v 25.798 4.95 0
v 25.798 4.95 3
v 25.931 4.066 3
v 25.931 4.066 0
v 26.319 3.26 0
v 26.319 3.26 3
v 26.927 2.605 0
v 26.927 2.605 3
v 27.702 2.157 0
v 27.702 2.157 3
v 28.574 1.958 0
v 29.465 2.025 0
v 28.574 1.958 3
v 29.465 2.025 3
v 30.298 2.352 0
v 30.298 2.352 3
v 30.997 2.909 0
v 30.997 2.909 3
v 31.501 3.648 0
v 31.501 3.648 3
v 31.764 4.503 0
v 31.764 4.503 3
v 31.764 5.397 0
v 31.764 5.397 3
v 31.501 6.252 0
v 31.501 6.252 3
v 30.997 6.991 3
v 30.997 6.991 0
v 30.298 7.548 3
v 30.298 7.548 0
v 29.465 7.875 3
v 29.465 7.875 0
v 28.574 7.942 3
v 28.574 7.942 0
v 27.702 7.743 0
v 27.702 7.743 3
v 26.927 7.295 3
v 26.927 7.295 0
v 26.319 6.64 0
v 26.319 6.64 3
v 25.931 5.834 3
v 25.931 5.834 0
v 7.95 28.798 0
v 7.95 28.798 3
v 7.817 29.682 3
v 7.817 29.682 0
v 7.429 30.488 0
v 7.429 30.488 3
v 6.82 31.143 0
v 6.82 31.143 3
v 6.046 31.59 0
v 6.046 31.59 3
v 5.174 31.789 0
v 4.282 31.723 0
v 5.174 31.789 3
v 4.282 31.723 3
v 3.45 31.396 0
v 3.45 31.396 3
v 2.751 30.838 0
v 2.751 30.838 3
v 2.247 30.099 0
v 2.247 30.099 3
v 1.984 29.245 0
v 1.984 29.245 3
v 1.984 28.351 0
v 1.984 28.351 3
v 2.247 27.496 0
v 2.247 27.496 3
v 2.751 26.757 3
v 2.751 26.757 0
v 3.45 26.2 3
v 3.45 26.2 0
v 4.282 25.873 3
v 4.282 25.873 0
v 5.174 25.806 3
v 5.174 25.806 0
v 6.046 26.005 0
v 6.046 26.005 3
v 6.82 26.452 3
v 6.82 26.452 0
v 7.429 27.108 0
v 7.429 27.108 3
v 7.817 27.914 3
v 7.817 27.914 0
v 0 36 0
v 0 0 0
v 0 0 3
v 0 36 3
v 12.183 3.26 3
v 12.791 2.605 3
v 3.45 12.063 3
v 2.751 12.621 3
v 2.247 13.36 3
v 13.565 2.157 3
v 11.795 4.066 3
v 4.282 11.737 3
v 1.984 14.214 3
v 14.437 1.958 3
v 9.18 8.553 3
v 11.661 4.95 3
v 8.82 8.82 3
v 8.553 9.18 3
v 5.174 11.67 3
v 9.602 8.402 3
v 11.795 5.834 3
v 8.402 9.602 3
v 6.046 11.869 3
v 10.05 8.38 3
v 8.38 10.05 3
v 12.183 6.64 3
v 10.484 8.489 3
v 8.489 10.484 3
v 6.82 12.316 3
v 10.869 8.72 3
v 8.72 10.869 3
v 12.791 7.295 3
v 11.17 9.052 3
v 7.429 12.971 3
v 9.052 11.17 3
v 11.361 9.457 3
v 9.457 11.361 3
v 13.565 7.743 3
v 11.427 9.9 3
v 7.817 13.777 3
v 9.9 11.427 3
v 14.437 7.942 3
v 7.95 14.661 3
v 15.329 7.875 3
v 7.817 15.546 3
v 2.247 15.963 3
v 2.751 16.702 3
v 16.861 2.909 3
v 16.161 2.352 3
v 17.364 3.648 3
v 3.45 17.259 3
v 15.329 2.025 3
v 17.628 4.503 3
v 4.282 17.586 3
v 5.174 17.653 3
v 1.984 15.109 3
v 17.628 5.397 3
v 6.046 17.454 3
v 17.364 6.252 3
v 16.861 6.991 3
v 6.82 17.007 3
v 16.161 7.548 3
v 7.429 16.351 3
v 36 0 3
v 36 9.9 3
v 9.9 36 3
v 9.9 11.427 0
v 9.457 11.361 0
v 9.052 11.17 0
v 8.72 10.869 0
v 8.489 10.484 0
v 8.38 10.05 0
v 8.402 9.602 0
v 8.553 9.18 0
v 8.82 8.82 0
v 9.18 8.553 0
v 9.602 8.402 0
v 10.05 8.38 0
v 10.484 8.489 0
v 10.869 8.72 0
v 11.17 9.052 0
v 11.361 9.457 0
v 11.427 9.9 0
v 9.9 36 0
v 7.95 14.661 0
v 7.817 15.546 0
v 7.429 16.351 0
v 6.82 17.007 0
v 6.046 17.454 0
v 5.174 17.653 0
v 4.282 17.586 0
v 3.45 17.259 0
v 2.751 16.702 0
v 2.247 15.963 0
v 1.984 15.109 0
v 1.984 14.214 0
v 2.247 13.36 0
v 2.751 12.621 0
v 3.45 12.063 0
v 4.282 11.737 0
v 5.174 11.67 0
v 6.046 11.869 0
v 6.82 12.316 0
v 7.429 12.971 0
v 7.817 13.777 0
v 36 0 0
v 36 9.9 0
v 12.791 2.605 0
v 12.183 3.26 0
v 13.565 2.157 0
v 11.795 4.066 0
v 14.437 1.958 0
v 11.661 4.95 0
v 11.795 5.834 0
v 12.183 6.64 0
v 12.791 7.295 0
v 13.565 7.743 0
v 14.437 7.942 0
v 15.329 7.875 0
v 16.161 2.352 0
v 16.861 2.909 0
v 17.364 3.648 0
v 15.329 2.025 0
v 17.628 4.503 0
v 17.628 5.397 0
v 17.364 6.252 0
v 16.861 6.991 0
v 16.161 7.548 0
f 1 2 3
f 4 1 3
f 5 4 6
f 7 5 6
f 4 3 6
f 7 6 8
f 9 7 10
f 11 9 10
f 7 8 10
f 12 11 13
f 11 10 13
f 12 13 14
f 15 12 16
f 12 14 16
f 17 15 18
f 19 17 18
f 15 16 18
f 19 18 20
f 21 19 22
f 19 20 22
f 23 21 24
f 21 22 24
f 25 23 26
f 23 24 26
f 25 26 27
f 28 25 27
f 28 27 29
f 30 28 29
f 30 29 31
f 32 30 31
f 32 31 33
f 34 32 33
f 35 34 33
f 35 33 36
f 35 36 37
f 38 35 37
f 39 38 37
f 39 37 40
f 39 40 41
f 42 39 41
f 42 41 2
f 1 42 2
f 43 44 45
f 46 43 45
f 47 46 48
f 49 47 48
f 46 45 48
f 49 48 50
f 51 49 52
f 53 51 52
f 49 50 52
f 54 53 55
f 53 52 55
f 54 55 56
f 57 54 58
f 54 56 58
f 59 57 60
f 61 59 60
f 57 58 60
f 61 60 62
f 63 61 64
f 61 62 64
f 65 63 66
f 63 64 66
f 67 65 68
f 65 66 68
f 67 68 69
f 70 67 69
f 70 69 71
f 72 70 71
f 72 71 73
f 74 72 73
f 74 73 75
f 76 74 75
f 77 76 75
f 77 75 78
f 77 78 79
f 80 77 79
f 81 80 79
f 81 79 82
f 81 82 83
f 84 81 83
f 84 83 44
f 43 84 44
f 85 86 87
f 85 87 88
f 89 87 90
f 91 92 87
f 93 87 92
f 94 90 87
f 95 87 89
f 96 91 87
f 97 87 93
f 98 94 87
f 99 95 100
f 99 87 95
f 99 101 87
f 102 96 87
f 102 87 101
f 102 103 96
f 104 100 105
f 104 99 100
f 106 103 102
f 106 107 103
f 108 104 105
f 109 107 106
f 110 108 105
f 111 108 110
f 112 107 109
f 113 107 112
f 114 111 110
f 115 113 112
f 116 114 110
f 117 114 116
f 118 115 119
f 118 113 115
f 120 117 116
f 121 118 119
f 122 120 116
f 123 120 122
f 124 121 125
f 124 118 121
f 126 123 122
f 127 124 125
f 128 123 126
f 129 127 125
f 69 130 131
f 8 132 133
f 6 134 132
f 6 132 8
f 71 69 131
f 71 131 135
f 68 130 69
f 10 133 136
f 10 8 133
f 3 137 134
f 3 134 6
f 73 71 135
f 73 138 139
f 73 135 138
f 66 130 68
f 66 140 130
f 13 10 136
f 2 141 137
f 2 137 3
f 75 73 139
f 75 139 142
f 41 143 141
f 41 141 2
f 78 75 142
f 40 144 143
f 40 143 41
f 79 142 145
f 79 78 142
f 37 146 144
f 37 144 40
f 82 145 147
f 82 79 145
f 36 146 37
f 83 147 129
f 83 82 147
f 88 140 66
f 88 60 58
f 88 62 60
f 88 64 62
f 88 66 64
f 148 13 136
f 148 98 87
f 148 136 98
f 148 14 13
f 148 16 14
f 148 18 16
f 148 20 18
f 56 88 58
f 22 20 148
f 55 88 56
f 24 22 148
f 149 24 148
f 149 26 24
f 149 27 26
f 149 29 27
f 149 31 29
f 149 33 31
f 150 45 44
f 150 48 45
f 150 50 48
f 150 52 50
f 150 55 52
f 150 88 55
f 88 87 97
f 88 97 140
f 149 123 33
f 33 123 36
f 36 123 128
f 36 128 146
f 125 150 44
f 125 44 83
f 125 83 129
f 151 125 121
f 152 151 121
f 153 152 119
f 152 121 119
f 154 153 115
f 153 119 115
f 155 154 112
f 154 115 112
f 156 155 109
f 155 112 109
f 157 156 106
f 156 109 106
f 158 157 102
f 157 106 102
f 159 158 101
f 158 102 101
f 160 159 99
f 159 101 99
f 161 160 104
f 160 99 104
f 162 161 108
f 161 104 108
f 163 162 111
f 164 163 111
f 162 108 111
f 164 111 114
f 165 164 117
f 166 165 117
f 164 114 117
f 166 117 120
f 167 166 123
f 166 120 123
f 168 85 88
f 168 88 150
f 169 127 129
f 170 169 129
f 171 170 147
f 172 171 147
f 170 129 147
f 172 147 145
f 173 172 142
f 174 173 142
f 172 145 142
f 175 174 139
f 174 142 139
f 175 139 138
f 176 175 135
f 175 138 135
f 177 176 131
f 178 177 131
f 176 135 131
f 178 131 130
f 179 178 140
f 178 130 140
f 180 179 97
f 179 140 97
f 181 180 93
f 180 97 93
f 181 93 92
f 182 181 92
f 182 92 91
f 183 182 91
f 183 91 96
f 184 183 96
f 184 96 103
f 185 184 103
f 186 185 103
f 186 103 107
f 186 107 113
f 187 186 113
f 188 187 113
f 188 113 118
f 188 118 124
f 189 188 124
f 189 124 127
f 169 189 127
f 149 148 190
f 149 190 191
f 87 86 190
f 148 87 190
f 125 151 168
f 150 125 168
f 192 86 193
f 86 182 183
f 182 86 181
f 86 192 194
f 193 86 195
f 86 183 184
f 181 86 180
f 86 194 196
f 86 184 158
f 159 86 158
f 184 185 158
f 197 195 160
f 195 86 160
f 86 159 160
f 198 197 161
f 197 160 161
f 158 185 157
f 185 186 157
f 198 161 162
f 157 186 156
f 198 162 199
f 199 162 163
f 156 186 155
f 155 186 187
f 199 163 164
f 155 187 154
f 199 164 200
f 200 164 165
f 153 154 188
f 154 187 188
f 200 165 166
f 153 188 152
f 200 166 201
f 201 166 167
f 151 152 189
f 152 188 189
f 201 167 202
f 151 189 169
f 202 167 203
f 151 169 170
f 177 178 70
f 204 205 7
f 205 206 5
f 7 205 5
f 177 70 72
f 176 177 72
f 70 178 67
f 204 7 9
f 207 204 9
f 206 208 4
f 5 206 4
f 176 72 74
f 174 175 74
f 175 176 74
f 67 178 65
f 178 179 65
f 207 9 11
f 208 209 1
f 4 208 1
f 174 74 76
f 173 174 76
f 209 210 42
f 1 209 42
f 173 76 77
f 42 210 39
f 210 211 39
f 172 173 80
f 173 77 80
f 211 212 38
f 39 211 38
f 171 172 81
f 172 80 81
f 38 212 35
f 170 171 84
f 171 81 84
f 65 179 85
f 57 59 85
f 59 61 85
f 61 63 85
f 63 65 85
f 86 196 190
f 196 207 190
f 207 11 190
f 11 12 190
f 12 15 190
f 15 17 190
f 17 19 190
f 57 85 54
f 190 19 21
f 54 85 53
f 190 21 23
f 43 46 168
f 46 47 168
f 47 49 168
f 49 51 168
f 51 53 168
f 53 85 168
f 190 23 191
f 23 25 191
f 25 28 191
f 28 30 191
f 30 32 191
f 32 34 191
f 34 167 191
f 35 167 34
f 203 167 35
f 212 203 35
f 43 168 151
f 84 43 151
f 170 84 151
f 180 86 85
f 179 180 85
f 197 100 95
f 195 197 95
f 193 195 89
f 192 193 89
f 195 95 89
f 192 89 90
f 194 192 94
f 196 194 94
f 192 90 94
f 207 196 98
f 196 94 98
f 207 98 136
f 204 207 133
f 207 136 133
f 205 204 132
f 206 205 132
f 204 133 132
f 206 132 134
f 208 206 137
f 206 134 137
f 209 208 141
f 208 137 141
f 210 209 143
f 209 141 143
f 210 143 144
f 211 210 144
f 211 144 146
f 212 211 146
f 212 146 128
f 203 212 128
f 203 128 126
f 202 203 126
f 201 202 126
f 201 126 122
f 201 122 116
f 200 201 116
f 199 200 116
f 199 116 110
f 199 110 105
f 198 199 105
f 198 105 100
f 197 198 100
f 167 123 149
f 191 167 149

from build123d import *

# Parameters (mm, degrees)
SKETCH_1_W          = 9.9
SKETCH_1_H          = 36
EXTRUDE_1_DEPTH     = 3
SKETCH_2_W          = 36
SKETCH_2_H          = 9.9
EXTRUDE_2_DEPTH     = 3
SKETCH_3_R          = 3
CUT_EXTRUDE_1_DEPTH = 52
SKETCH_4_R          = 1.527094442
CUT_EXTRUDE_2_DEPTH = 52


with BuildPart() as part:
    # 草图1 → 凸台-拉伸1 (new body)
    with BuildSketch(Plane.XY):
        with Locations((4.95, 18)):
            Rectangle(SKETCH_1_W, SKETCH_1_H)
    extrude(amount=EXTRUDE_1_DEPTH)

    # 草图2 → 凸台-拉伸2 (add)
    with BuildSketch(Plane.XY.offset(3)):
        with Locations((18, 4.95)):
            Rectangle(SKETCH_2_W, SKETCH_2_H)
    extrude(amount=-EXTRUDE_2_DEPTH)

    # 草图3 → 切除-拉伸1 (cut, through all)
    with BuildSketch(Plane.XY.offset(3)):
        with Locations((4.95, 28.797804346)):
            Circle(SKETCH_3_R)
        with Locations((4.95, 14.661403113)):
            Circle(SKETCH_3_R)
        with Locations(Location((14.661403113, 4.95, 0), (0, 0, 180))):
            Circle(SKETCH_3_R)
        with Locations(Location((28.797804346, 4.95, 0), (0, 0, 180))):
            Circle(SKETCH_3_R)
    extrude(amount=-CUT_EXTRUDE_1_DEPTH, mode=Mode.SUBTRACT)

    # 草图4 → 切除-拉伸2 (cut, through all)
    with BuildSketch(Plane.XY.offset(3)):
        with Locations((9.9, 9.9)):
            Circle(SKETCH_4_R)
    extrude(amount=-CUT_EXTRUDE_2_DEPTH, mode=Mode.SUBTRACT)


solid = part.part
